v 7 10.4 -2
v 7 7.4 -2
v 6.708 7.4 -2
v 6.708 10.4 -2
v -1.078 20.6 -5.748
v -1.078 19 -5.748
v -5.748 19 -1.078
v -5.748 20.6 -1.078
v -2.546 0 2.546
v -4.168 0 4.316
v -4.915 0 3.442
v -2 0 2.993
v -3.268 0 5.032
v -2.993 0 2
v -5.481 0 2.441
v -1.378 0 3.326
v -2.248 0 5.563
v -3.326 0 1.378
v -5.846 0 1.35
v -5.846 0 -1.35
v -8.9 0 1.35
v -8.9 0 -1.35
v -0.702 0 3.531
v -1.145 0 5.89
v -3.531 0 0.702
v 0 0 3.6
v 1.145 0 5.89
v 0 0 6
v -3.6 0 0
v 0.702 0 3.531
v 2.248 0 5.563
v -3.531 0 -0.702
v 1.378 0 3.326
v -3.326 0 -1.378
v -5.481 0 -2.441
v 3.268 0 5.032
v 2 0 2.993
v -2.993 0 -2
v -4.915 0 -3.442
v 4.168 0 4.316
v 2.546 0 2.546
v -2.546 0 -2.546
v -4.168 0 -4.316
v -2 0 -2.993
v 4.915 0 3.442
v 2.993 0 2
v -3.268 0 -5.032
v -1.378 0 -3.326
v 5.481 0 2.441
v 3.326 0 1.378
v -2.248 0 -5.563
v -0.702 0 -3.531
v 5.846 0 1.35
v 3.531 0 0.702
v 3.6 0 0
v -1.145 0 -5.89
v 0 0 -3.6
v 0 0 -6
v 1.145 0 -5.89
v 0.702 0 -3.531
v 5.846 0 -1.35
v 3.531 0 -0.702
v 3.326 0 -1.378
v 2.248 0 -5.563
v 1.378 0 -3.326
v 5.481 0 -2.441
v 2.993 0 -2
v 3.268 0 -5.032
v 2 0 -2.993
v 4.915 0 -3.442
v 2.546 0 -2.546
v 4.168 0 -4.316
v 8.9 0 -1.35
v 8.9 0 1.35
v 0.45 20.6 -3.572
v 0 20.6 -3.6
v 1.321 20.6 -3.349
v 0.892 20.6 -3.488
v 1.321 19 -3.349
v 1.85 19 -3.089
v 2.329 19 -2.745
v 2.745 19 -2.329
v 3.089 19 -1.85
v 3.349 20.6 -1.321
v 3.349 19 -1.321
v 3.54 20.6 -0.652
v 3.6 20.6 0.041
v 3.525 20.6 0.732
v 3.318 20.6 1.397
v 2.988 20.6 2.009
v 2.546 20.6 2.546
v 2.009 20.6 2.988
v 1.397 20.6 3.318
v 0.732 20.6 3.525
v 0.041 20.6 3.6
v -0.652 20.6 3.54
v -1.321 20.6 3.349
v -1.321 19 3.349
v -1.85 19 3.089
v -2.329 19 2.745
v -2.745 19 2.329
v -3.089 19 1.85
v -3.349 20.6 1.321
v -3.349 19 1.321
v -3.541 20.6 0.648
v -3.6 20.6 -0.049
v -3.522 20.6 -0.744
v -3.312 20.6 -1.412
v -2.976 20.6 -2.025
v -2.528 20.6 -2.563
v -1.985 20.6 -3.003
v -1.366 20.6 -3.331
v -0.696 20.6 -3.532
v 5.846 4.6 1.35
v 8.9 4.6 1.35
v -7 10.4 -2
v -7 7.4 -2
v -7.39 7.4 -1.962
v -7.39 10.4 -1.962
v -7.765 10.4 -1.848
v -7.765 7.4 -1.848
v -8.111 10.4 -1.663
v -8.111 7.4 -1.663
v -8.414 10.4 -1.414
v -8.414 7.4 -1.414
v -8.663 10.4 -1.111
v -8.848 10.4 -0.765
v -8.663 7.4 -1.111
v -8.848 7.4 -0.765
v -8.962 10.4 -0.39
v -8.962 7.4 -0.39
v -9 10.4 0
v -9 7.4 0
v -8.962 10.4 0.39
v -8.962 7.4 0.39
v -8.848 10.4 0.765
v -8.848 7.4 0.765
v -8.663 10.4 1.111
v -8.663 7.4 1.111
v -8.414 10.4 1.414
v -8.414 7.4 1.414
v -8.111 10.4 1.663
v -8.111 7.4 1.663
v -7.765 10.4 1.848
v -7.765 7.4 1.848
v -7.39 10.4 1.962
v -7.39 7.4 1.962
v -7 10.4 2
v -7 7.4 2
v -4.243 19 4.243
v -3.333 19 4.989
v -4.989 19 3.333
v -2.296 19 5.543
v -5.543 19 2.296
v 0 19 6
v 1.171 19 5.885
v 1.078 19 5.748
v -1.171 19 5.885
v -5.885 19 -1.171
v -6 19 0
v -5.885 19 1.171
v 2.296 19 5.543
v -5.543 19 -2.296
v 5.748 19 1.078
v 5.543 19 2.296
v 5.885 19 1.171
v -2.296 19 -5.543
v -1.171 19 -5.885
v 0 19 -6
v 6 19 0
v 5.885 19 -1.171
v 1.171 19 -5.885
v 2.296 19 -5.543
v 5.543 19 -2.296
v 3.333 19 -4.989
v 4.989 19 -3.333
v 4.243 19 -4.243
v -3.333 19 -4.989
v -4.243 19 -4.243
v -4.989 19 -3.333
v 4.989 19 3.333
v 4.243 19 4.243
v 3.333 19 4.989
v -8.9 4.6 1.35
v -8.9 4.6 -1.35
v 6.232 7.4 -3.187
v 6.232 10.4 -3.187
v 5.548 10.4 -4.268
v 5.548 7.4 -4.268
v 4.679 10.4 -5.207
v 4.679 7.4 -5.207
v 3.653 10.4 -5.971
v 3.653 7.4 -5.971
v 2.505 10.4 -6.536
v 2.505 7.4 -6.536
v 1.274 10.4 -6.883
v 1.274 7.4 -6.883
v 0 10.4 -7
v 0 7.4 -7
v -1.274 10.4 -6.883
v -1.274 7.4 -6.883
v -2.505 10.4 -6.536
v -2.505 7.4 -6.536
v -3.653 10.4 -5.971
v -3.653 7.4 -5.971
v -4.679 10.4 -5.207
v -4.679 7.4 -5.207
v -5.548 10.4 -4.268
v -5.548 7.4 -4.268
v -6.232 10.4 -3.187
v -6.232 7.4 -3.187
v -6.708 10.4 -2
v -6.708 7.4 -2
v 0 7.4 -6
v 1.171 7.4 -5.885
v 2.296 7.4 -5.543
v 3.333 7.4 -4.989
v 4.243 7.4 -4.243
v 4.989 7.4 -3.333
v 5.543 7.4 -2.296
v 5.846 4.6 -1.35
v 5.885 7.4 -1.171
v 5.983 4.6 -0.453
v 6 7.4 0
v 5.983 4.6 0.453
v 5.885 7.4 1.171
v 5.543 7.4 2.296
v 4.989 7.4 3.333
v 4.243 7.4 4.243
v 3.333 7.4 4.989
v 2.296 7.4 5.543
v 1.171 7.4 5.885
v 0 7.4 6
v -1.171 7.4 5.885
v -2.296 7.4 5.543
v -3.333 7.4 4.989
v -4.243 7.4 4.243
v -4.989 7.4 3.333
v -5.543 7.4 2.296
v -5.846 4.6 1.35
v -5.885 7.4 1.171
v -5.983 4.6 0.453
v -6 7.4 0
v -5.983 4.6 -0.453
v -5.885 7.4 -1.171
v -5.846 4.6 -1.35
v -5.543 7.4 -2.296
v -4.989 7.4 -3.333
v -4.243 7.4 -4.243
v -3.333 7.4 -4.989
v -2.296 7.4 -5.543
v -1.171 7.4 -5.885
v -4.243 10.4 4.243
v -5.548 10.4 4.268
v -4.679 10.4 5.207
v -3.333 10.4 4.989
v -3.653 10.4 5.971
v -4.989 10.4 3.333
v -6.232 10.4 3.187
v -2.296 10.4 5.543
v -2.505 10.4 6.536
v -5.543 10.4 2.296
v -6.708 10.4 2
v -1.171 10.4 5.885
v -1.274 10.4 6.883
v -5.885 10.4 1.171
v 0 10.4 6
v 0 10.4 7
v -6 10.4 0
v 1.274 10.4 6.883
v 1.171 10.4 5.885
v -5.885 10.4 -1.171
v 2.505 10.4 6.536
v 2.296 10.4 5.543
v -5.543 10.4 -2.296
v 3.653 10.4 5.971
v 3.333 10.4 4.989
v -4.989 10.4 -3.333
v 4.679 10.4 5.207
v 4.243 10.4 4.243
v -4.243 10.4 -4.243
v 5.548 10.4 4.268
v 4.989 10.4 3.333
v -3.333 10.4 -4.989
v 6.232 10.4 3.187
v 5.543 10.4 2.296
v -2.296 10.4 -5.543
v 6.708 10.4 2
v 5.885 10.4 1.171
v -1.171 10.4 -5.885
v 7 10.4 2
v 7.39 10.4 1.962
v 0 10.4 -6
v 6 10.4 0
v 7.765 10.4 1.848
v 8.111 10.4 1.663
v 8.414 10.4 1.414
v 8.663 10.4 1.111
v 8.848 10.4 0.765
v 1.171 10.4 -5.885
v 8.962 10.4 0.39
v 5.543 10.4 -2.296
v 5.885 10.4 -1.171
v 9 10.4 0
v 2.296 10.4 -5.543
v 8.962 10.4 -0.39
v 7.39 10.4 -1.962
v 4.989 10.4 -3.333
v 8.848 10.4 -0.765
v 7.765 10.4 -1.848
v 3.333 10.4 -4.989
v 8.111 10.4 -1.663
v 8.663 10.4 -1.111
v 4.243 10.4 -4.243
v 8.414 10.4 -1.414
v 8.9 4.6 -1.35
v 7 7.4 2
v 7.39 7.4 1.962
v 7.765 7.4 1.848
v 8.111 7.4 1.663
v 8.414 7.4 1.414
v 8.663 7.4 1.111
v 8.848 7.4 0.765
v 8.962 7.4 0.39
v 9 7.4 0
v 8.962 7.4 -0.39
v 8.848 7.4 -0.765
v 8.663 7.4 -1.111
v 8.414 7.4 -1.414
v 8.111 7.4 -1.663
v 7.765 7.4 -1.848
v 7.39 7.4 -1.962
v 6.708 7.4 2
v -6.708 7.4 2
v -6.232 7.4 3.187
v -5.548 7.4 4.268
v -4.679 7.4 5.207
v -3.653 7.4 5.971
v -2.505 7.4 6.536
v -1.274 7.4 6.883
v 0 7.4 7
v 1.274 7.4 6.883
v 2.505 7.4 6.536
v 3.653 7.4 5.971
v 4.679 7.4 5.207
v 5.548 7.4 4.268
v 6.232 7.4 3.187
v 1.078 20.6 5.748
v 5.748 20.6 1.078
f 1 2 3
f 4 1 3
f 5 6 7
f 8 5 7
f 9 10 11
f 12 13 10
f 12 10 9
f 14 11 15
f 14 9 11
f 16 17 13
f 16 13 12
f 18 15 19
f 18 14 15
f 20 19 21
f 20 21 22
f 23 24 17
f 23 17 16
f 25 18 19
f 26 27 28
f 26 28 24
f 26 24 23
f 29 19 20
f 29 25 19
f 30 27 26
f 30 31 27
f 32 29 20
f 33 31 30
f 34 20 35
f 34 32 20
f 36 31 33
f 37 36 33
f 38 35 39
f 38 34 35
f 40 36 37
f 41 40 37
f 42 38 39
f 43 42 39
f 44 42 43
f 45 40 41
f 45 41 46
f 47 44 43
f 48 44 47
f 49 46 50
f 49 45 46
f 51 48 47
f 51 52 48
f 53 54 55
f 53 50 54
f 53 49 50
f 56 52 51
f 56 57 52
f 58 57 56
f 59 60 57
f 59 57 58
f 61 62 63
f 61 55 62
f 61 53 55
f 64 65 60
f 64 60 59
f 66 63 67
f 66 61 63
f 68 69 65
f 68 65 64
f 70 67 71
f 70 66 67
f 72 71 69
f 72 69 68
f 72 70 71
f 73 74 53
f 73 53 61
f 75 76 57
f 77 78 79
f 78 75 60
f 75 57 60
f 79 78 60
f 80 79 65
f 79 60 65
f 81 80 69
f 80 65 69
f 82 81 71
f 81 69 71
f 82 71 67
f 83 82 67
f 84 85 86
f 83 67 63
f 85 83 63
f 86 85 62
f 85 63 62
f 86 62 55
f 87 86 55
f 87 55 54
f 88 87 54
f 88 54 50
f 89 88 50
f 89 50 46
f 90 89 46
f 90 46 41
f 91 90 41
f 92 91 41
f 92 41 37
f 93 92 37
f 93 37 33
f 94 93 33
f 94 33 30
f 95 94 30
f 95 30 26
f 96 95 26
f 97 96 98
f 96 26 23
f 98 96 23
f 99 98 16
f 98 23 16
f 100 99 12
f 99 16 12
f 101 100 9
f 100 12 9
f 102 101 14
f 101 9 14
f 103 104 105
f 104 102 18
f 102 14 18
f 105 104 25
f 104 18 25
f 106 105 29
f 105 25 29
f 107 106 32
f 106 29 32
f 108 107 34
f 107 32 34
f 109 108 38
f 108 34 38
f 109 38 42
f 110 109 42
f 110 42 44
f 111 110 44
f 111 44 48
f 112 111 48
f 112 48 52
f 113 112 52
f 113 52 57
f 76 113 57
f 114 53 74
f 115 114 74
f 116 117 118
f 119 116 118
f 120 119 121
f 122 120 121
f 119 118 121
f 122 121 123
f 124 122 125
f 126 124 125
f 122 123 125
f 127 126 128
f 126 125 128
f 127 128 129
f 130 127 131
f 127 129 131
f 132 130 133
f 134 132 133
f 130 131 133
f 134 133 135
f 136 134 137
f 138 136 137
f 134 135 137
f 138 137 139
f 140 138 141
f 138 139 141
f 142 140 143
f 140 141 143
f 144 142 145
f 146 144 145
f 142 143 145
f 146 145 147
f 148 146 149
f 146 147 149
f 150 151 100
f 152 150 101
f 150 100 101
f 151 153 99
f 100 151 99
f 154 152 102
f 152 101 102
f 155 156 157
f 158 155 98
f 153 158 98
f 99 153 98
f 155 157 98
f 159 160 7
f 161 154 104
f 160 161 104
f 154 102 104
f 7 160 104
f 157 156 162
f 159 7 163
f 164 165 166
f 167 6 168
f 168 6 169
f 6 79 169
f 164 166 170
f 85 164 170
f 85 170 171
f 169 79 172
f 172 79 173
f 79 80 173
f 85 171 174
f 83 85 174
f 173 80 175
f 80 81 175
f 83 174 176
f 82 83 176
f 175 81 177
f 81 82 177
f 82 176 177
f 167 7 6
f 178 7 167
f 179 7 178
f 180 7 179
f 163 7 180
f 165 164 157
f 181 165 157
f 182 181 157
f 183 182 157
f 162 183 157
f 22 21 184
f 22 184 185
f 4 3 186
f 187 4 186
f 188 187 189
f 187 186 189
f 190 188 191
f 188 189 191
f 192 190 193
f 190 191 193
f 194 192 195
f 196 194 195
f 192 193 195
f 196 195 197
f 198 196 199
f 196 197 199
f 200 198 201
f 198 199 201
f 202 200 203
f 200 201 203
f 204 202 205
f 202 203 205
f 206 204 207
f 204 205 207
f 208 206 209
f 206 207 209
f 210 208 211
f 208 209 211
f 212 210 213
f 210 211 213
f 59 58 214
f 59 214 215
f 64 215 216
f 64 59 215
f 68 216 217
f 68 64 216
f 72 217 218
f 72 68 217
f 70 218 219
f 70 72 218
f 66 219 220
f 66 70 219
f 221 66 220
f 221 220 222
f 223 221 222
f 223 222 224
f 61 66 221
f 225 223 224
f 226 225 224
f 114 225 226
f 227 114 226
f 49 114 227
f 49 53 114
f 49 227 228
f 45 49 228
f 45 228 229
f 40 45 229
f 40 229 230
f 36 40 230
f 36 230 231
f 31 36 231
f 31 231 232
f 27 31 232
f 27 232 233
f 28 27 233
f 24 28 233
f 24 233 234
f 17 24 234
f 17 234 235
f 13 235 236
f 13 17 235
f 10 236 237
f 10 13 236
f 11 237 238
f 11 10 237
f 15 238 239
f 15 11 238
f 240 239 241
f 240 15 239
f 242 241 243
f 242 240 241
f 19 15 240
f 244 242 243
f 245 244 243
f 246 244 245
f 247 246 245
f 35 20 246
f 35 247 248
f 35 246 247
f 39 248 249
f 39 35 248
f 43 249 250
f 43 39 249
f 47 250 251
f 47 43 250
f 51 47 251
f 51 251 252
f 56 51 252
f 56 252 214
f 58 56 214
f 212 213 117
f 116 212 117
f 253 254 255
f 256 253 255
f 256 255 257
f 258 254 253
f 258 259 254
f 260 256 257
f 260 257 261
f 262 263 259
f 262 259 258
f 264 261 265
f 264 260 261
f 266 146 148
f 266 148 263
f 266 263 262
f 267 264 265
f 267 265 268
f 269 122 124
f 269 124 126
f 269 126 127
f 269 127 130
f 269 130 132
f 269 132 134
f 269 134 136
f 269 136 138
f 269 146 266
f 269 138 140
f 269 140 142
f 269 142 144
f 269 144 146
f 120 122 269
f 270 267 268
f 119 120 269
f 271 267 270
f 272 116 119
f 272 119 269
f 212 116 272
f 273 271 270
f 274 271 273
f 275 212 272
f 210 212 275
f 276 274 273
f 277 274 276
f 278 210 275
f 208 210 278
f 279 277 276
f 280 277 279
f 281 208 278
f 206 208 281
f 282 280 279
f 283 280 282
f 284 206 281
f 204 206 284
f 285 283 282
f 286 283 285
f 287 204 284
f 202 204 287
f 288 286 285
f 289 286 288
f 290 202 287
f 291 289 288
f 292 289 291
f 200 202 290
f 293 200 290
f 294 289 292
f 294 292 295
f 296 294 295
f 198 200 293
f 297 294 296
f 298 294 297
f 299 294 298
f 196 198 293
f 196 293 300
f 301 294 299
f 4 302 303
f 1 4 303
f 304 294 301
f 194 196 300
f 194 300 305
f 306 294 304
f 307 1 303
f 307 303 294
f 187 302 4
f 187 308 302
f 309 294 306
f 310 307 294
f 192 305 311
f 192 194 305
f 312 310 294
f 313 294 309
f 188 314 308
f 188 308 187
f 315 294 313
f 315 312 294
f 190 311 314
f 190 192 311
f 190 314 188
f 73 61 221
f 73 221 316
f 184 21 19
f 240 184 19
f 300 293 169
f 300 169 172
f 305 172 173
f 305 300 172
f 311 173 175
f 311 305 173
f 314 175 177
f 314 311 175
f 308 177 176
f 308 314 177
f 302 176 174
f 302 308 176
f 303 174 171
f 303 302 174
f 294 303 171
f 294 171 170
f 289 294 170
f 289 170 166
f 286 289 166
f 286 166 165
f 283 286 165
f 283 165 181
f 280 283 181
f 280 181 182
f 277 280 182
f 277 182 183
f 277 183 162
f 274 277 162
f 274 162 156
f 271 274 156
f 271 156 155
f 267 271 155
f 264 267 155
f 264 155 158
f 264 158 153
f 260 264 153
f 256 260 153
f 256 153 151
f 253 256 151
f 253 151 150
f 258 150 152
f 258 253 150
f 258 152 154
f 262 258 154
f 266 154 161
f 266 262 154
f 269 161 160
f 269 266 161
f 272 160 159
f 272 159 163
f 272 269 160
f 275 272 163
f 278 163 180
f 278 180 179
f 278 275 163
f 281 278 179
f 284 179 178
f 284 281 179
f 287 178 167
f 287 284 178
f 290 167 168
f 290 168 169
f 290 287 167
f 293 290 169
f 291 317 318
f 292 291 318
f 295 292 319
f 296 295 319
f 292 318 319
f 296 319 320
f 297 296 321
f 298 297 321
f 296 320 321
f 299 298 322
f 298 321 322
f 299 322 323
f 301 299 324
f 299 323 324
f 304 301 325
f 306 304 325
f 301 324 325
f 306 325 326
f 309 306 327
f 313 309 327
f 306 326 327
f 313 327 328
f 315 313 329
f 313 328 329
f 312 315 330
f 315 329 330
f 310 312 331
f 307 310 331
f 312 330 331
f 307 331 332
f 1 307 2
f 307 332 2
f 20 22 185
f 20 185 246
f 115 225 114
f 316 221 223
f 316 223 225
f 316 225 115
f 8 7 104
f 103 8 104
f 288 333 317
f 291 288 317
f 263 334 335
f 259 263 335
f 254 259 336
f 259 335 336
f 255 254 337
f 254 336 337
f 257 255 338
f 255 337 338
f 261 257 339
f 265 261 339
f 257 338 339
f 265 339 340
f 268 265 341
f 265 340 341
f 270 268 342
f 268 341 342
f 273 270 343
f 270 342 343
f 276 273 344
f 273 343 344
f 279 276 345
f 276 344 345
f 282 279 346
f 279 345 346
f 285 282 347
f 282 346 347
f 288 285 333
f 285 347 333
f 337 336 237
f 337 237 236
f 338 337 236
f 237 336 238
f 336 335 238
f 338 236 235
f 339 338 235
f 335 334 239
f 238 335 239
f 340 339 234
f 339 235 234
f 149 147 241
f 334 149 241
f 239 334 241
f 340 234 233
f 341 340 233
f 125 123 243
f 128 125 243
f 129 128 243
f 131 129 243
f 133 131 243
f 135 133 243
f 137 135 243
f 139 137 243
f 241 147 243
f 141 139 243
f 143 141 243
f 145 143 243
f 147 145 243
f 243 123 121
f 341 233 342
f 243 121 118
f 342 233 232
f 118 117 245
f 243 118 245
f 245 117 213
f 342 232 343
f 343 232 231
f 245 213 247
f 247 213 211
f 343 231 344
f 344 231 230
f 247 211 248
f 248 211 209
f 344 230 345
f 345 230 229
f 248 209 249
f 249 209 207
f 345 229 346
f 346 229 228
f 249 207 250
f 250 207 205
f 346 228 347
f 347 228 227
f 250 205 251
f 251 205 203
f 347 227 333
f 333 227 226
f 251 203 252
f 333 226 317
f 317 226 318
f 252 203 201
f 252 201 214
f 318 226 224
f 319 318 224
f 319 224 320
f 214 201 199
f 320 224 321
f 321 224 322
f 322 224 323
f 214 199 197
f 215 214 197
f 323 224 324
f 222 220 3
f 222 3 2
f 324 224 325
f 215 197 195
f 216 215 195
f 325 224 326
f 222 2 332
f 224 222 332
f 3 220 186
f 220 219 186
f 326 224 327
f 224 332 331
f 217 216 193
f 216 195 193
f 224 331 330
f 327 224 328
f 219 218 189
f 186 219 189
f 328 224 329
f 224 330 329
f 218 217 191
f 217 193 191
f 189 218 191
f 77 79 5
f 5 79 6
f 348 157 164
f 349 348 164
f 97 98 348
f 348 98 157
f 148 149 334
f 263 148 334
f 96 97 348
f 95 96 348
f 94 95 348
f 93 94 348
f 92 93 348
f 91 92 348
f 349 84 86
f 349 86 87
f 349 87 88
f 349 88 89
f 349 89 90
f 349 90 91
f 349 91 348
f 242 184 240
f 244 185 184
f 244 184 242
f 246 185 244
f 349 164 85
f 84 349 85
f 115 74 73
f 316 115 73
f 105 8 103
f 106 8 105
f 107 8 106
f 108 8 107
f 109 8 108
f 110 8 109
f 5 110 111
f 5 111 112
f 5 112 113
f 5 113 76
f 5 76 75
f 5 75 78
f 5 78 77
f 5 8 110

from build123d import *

# Parameters (mm, degrees)
SKETCH_1_W          = 17.8
SKETCH_1_H          = 2.7
EXTRUDE_1_DEPTH     = 4.6
SKETCH_2_R          = 6
EXTRUDE_2_DEPTH     = 19
EXTRUDE_3_DEPTH     = 1.6
BOSS_EXTRUDE2_DEPTH = 3
SKETCH_6_R          = 3.6
CUT_EXTRUDE2_DEPTH  = 24.544850817


with BuildPart() as part:
    # 草图1 → 凸台-拉伸1 (new body)
    with BuildSketch(Plane(origin=(0, 0, 0), x_dir=(1, 0, 0), z_dir=(0, 1, 0))):
        Rectangle(SKETCH_1_W, SKETCH_1_H)
    extrude(amount=EXTRUDE_1_DEPTH)

    # 草图2 → 凸台-拉伸2 (add)
    with BuildSketch(Plane(origin=(0, 0, 0), x_dir=(-1, 0, 0), z_dir=(0, -1, 0))):
        with Locations(Location((0, 0, 0), (0, 0, 90))):
            Circle(SKETCH_2_R)
    extrude(amount=-EXTRUDE_2_DEPTH)

    # 草图4 → 凸台-拉伸3 (add)
    with BuildSketch(Plane(origin=(0, 19, 0), x_dir=(1, 0, 0), z_dir=(0, 1, 0))):
        Polygon((-5.747717471, 1.077984288), (-3.323048318, -1.346684865), (1.346684865, 3.323048318), (-1.077984288, 5.747717471), align=None)
        Polygon((-1.346684865, -3.323048318), (1.077984288, -5.747717471), (5.747717471, -1.077984288), (3.323048318, 1.346684865), align=None)
    extrude(amount=EXTRUDE_3_DEPTH)

    # Sketch4 → Boss-Extrude2 (add)
    with BuildSketch(Plane(origin=(0, 7.4, 0), x_dir=(1, 0, 0), z_dir=(0, 1, 0))):
        with BuildLine():
            ThreePointArc((6.708203932, 2), (0, 7), (-6.708203932, 2))
            Line((-6.708203932, 2), (6.708203932, 2))
        make_face()
        with BuildLine():
            ThreePointArc((-6.708203932, 2), (-6.926666858, 1.010587075), (-7, 0))
            Line((-7, 0), (7, 0))
            ThreePointArc((7, 0), (6.926666858, 1.010587075), (6.708203932, 2))
            Line((6.708203932, 2), (-6.708203932, 2))
        make_face()
        with BuildLine():
            ThreePointArc((-6.708203932, -2), (-6.926666858, -1.010587075), (-7, 0))
            ThreePointArc((-7, 0), (-6.926666858, 1.010587075), (-6.708203932, 2))
            Line((-6.708203932, 2), (-7, 2))
            ThreePointArc((-7, 2), (-9, 0), (-7, -2))
            Line((-7, -2), (-6.708203932, -2))
        make_face()
        with BuildLine():
            Line((7, 0), (-7, 0))
            ThreePointArc((-7, 0), (-6.926666858, -1.010587075), (-6.708203932, -2))
            Line((-6.708203932, -2), (6.708203932, -2))
            ThreePointArc((6.708203932, -2), (6.926666858, -1.010587075), (7, 0))
        make_face()
        with BuildLine():
            Line((6.708203932, -2), (-6.708203932, -2))
            ThreePointArc((-6.708203932, -2), (0, -7), (6.708203932, -2))
        make_face()
        with BuildLine():
            ThreePointArc((6.708203932, 2), (6.926666858, 1.010587075), (7, 0))
            ThreePointArc((7, 0), (6.926666858, -1.010587075), (6.708203932, -2))
            Line((6.708203932, -2), (7, -2))
            ThreePointArc((7, -2), (9, 0), (7, 2))
            Line((7, 2), (6.708203932, 2))
        make_face()
    extrude(amount=BOSS_EXTRUDE2_DEPTH)

    # 草图6 → Cut-Extrude2 (cut, through all)
    with BuildSketch(Plane.XZ):
        with Locations(Location((0, 0, 0), (0, 0, 270))):
            Circle(SKETCH_6_R)
    extrude(amount=-CUT_EXTRUDE2_DEPTH, mode=Mode.SUBTRACT)


solid = part.part
